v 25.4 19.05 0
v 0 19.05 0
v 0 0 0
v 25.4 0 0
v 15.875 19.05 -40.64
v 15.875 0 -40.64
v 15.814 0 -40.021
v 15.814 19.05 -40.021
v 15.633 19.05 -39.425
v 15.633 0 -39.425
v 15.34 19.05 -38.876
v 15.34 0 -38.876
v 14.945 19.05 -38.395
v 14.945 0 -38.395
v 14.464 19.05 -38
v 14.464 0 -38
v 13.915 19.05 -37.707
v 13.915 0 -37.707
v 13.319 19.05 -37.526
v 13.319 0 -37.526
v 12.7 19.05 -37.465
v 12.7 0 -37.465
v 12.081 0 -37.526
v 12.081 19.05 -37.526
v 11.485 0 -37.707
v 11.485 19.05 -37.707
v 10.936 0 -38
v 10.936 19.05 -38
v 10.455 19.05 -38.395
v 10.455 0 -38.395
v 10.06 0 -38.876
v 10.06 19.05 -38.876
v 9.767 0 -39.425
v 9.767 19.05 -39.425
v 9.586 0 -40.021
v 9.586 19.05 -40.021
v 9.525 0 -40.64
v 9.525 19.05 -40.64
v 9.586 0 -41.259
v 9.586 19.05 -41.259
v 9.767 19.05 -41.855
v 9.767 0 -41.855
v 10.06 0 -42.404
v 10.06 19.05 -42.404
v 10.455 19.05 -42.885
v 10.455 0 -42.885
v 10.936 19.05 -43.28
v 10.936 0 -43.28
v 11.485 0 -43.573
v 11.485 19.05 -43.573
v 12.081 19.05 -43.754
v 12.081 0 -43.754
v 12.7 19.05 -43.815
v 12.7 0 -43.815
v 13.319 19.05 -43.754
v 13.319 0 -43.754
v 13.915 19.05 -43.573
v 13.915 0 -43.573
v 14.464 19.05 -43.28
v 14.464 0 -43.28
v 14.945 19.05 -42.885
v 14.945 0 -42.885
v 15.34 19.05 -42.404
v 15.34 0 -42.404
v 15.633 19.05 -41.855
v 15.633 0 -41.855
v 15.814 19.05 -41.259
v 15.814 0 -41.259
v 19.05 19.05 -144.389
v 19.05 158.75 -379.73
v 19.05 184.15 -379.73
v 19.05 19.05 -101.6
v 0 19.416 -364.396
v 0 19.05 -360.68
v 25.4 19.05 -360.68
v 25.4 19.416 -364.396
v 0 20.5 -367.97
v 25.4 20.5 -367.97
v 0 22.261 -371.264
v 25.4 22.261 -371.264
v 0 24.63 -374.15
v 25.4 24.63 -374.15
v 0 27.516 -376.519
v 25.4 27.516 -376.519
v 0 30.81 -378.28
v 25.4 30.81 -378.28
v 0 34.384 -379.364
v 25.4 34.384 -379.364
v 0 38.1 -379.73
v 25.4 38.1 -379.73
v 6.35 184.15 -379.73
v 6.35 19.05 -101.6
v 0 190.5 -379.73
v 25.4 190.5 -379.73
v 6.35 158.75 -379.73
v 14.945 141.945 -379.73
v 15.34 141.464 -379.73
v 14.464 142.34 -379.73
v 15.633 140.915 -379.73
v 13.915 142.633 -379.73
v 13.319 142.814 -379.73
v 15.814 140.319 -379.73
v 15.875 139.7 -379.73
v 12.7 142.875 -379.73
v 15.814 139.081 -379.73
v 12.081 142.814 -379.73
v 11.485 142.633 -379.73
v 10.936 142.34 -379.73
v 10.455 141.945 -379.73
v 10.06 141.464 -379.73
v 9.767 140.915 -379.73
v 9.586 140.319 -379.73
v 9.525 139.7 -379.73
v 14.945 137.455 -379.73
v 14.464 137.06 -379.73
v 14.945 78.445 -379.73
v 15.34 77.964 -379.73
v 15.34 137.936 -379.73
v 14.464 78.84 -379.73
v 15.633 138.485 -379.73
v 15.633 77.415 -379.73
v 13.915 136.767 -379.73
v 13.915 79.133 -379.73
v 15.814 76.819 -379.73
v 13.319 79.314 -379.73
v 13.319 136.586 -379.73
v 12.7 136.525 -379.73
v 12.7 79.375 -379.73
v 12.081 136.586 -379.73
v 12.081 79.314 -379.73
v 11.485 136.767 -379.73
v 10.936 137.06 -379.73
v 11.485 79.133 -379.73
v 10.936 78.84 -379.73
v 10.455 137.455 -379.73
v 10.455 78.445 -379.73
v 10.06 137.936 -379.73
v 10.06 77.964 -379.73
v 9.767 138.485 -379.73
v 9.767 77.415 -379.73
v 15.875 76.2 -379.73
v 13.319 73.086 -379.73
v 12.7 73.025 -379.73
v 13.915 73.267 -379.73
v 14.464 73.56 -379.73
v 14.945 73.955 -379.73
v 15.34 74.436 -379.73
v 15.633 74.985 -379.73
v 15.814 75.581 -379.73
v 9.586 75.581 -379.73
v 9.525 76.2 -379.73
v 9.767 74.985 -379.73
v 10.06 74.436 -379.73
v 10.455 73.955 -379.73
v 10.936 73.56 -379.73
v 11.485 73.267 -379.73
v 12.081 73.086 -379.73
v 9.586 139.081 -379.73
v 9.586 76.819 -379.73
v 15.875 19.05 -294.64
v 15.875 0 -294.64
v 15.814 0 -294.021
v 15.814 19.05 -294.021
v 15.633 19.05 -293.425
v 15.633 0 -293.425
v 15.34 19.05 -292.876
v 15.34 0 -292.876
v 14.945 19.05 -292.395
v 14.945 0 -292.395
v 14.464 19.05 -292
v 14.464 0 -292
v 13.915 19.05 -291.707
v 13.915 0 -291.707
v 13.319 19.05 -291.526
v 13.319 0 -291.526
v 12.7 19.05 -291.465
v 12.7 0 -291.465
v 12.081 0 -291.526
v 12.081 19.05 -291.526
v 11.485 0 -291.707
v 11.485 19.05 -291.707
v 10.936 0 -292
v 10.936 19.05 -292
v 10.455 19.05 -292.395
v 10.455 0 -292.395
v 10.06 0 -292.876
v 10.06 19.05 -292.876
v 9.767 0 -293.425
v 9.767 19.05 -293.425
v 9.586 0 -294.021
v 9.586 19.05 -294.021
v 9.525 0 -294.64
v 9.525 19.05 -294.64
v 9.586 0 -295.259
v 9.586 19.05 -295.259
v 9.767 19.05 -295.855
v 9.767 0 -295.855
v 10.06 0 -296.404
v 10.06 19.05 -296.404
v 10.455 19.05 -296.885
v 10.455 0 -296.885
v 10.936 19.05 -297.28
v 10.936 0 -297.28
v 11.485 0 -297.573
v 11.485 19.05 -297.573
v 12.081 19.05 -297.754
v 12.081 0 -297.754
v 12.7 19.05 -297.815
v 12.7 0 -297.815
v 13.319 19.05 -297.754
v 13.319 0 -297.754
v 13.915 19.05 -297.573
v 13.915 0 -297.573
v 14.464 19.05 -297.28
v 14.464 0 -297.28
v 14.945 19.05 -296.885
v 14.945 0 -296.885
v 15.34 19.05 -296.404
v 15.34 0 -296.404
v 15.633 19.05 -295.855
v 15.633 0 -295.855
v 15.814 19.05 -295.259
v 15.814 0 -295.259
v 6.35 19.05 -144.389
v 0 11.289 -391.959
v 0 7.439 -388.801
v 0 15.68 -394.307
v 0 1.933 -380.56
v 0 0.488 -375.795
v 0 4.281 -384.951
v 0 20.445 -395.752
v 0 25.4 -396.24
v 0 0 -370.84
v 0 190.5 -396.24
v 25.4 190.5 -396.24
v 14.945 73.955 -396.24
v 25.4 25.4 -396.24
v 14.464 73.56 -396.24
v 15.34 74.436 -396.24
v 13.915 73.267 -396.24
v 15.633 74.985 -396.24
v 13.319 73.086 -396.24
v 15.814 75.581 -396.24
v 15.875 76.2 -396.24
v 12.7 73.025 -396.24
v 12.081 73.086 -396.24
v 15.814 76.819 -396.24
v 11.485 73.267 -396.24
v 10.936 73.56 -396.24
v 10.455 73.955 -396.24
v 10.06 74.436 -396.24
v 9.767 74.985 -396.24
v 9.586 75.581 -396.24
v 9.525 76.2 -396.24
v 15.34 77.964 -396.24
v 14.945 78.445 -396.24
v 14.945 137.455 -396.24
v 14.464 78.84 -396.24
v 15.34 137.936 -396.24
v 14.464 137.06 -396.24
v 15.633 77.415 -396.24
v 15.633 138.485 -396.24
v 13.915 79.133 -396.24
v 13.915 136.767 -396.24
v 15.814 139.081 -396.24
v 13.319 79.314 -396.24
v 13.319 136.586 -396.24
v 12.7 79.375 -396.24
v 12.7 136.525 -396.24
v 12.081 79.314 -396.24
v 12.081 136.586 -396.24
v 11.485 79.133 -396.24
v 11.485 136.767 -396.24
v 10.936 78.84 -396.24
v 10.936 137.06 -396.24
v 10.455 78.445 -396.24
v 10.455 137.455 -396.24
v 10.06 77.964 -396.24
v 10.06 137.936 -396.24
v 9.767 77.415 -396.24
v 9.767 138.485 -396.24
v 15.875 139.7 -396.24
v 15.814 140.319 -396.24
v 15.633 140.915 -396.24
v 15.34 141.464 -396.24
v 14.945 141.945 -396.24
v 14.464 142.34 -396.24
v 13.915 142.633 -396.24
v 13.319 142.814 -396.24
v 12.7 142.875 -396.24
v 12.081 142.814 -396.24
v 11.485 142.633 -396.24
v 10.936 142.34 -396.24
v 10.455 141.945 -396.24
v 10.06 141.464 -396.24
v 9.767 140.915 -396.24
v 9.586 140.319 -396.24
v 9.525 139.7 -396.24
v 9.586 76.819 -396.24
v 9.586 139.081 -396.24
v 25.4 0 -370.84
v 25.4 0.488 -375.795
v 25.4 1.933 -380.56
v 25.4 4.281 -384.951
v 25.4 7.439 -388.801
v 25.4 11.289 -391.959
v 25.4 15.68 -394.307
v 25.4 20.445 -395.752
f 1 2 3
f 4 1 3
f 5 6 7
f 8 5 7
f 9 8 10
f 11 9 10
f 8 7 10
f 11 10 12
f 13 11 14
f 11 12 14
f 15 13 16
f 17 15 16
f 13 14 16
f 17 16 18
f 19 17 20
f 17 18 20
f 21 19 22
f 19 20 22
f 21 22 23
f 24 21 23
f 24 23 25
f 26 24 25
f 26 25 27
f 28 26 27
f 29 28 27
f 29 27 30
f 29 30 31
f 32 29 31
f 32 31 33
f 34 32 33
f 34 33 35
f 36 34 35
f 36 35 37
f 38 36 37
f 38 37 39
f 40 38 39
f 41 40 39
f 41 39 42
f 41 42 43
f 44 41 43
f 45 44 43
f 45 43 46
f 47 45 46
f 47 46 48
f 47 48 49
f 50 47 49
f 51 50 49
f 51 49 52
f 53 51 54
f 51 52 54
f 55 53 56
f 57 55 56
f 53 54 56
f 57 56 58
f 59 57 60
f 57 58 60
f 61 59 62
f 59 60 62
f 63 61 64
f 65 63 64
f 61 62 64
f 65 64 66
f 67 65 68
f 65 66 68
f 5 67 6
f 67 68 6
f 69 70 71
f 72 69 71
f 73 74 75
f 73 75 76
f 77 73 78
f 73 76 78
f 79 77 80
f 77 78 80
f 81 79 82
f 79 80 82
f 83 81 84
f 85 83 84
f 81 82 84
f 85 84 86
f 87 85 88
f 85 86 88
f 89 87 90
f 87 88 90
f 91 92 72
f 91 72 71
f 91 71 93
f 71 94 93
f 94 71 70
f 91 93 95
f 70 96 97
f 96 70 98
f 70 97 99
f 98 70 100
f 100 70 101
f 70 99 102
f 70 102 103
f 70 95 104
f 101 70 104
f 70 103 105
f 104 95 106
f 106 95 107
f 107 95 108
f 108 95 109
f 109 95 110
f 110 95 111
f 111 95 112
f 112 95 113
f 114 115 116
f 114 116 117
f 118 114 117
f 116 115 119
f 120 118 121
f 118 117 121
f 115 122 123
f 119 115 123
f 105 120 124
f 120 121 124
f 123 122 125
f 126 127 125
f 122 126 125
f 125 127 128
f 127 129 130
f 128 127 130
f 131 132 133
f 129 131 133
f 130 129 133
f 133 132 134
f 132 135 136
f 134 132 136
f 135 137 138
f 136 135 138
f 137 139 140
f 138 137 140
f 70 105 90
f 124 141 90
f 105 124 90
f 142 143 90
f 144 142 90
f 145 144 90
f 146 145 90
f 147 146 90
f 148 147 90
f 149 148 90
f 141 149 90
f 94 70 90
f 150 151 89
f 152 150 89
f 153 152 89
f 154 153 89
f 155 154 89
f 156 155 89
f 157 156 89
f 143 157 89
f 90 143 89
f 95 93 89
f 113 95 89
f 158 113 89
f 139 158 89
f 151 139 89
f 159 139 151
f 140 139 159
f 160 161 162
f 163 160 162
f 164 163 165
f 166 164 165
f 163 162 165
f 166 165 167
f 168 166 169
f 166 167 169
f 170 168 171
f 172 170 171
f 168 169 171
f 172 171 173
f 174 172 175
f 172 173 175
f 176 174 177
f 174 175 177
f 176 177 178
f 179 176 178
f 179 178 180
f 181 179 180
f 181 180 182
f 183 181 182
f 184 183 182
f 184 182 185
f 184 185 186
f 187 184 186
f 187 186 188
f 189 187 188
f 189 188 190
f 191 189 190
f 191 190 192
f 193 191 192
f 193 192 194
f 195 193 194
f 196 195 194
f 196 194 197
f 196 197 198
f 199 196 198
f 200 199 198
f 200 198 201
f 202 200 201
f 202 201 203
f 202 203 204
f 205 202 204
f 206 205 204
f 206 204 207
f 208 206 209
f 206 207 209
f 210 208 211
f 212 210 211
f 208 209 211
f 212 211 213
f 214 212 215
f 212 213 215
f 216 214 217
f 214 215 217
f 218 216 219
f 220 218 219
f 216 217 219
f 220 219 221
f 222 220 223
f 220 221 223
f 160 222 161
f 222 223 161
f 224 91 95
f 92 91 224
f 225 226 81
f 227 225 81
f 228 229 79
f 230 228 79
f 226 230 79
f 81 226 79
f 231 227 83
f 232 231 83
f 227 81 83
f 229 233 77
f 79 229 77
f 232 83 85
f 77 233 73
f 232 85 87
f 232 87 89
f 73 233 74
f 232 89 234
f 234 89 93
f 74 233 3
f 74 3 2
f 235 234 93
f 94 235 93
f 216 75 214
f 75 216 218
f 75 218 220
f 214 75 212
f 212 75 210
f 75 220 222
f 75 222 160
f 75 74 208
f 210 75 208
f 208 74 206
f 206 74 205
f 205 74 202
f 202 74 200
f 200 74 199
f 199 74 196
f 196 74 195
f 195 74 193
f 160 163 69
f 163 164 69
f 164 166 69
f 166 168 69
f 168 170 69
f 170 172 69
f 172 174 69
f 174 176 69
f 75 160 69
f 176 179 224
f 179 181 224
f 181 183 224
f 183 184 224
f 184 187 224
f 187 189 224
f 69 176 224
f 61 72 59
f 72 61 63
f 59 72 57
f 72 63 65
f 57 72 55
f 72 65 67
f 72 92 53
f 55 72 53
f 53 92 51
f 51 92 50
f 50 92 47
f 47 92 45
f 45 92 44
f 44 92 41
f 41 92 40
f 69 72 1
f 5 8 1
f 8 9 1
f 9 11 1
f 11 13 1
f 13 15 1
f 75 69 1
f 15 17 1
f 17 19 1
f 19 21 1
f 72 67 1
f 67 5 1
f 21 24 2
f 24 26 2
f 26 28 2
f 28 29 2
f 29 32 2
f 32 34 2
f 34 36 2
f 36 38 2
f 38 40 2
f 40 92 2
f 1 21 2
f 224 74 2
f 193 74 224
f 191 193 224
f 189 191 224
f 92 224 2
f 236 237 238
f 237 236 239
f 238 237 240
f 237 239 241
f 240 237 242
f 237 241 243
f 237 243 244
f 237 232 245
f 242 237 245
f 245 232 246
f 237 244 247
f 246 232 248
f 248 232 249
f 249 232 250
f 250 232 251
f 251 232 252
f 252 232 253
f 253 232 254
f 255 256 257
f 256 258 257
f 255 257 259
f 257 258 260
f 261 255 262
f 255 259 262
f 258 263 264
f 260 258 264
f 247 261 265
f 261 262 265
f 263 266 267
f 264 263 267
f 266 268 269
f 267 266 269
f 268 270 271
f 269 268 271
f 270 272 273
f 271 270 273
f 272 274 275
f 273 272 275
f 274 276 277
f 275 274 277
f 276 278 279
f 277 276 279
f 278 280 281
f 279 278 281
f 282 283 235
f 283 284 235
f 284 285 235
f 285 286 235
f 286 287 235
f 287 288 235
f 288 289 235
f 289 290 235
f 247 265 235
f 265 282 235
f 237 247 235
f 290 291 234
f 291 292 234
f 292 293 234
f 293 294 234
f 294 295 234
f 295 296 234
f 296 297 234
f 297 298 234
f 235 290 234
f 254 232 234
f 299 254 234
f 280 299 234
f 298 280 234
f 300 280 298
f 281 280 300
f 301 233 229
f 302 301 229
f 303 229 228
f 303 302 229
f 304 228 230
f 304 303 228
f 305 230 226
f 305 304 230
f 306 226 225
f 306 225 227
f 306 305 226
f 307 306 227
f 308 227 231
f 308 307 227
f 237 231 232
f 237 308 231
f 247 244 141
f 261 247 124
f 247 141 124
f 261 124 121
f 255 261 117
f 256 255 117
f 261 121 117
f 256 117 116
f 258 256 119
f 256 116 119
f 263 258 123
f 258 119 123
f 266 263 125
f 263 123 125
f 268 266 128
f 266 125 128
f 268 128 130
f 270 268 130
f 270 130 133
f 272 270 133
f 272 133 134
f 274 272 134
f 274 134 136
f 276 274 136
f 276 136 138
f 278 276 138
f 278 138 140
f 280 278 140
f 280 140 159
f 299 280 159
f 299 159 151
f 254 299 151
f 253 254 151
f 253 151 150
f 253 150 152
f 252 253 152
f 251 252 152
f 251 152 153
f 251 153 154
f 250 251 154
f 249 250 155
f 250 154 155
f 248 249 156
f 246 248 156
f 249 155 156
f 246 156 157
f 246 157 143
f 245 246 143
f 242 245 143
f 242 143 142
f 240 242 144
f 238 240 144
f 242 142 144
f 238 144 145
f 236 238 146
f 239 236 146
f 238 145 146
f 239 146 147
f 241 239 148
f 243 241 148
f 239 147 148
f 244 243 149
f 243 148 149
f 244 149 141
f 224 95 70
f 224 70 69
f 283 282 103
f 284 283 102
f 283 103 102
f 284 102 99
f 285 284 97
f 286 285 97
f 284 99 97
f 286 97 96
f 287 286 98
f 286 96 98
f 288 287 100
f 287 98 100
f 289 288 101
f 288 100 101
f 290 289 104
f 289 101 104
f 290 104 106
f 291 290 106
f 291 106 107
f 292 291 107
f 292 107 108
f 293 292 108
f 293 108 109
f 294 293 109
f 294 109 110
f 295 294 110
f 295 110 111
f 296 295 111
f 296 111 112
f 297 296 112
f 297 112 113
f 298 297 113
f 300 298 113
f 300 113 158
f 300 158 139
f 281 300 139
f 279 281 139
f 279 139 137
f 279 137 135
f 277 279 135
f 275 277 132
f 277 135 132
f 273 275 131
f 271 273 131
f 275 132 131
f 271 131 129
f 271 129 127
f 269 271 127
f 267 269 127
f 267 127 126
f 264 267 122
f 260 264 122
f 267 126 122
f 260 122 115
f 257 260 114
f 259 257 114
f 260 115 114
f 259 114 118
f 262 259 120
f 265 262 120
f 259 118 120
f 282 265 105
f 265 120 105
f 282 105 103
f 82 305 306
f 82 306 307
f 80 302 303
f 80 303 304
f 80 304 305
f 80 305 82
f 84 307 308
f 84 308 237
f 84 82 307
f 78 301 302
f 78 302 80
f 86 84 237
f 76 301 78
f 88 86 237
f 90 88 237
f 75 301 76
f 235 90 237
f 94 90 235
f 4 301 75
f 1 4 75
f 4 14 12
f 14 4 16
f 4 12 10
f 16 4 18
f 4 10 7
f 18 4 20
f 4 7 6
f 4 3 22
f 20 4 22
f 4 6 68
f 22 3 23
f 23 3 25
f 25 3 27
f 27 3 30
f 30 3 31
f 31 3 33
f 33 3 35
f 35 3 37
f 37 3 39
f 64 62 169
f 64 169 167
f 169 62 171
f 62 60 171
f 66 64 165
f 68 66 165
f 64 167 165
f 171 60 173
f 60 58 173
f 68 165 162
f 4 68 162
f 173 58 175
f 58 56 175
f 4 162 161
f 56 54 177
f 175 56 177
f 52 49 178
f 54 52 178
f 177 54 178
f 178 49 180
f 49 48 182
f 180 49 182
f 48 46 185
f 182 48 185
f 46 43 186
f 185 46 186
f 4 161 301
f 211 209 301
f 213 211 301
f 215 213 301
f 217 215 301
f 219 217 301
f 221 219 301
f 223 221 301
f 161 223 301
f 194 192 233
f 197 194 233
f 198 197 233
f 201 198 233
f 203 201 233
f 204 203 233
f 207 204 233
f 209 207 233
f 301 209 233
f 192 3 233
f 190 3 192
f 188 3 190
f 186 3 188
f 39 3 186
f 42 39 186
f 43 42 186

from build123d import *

# Parameters (mm, degrees)
F1_DEPTH  = 25.4
F2_R      = 25.4
F3_R      = 19.05
F5_DEPTH  = 25.4
F7_DEPTH  = 6.35
F9_DEPTH  = 6.35
F10_R     = 3.175
F11_DEPTH = 25.4
F12_R     = 3.175
F13_DEPTH = 25.4


with BuildPart() as f1:
    # F0 (on Right) → F1 (new body)
    with BuildSketch(Plane.YZ):
        Polygon((19.05, 0), (0, 0), (0, -396.24), (190.5, -396.24), (190.5, -379.73), (19.05, -379.73), align=None)
    extrude(amount=F1_DEPTH)

    # F2
    f2_edges = [f1.edges().sort_by_distance(p)[0] for p in [
        (12.7, 0, -396.24),
    ]]
    fillet(f2_edges, radius=F2_R)

    # F3
    f3_edges = [f1.edges().sort_by_distance(p)[0] for p in [
        (12.7, 19.05, -379.73),
    ]]
    fillet(f3_edges, radius=F3_R)

    # F4 (on face) → F5 (join)
    with BuildSketch(Plane(origin=(0, 0, 0), x_dir=(0, -1, 0), z_dir=(-1, 0, 0))):
        Polygon((-19.05, -101.6), (-184.15, -379.73), (-158.75, -379.73), (-19.05, -144.389231), align=None)
    extrude(amount=-F5_DEPTH)

    # F6 (on face) → F7 (cut)
    with BuildSketch(Plane(origin=(0, 0, 0), x_dir=(0, -1, 0), z_dir=(-1, 0, 0))):
        Polygon((-19.05, -144.389231), (-19.05, -101.6), (-184.15, -379.73), (-158.75, -379.73), align=None)
    extrude(amount=-F7_DEPTH, mode=Mode.SUBTRACT)

    # F8 (on face) → F9 (cut)
    with BuildSketch(Plane.YZ.offset(25.4)):
        Polygon((158.75, -379.73), (184.15, -379.73), (19.05, -101.6), (19.05, -144.389231), align=None)
    extrude(amount=-F9_DEPTH, mode=Mode.SUBTRACT)

    # F10 (on face) → F11 (cut)
    with BuildSketch(Plane.XY.offset(-379.73)):
        with Locations((12.7, 76.2)):
            Circle(F10_R)
        with Locations((12.7, 139.7)):
            Circle(F10_R)
    extrude(amount=-F11_DEPTH, mode=Mode.SUBTRACT)

    # F12 (on face) → F13 (cut)
    with BuildSketch(Plane.XZ):
        with Locations((12.7, -40.64)):
            Circle(F12_R)
        with Locations((12.7, -294.64)):
            Circle(F12_R)
    extrude(amount=-F13_DEPTH, mode=Mode.SUBTRACT)


solid = f1.part
